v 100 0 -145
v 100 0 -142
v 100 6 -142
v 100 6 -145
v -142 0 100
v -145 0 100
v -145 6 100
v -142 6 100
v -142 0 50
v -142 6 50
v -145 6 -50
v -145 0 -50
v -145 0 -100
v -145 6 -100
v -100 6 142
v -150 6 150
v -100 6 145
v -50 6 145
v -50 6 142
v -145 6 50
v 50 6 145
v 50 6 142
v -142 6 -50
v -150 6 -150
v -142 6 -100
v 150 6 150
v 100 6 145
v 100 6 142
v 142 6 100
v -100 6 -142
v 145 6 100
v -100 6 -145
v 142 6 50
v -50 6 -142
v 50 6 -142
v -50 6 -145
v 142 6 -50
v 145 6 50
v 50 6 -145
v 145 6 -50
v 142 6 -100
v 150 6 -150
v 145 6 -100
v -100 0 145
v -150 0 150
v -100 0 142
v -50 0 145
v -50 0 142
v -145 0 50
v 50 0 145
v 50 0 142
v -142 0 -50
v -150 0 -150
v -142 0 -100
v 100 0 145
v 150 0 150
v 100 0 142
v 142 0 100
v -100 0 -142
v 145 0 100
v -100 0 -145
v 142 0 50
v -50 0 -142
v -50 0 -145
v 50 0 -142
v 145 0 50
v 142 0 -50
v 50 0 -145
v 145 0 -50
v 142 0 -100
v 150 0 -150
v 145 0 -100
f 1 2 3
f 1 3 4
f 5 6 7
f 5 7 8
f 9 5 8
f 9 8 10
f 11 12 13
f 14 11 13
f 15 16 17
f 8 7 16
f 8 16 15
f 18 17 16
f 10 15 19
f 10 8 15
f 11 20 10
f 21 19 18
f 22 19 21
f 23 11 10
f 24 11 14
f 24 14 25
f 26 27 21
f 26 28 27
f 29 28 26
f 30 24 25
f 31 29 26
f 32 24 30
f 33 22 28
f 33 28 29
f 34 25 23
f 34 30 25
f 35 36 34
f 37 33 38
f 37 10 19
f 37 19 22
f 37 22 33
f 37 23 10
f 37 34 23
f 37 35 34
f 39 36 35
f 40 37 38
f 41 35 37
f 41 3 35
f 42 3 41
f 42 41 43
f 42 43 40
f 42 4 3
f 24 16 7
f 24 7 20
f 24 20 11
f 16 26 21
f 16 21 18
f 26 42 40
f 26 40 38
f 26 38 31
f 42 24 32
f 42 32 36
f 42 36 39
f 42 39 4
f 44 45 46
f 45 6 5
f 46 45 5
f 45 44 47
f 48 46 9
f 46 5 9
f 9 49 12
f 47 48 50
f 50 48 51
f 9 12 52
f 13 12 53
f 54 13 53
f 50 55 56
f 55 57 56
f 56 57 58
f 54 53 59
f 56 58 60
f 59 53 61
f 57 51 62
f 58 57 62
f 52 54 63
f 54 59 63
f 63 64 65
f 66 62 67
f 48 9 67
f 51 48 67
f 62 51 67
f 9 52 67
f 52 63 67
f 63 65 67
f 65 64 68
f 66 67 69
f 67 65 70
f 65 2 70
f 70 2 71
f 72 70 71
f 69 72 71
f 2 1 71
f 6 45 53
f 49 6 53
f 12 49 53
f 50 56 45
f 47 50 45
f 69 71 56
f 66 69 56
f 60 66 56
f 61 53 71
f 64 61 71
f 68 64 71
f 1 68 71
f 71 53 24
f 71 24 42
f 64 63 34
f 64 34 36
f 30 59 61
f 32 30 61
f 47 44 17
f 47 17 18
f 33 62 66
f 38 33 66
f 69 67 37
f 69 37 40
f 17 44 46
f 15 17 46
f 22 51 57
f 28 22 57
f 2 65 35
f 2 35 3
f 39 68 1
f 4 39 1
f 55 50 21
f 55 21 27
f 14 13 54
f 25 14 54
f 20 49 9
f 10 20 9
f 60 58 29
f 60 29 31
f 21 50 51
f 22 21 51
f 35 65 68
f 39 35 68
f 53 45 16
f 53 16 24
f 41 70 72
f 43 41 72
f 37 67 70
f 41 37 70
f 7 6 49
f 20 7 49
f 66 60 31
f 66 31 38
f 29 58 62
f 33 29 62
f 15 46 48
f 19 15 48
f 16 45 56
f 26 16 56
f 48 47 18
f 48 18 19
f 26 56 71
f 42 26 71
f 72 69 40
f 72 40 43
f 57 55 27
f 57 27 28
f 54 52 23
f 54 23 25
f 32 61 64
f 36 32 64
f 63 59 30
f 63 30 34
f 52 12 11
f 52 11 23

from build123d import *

# Parameters (mm, degrees)
SKETCH1_W           = 300
SKETCH1_H           = 300
SKETCH1_W_2         = 50
SKETCH1_H_2         = 3
SKETCH1_W_3         = 3
SKETCH1_H_3         = 50
BOSS_EXTRUDE1_DEPTH = 6


with BuildPart() as part:
    # Sketch1 → Boss-Extrude1 (new body)
    with BuildSketch(Plane(origin=(0, 0, 0), x_dir=(1, 0, 0), z_dir=(0, 1, 0))):
        Rectangle(SKETCH1_W, SKETCH1_H)
        with Locations((-75, 143.5)):
            Rectangle(SKETCH1_W_2, SKETCH1_H_2, mode=Mode.SUBTRACT)
        with Locations((75, 143.5)):
            Rectangle(SKETCH1_W_2, SKETCH1_H_2, mode=Mode.SUBTRACT)
        with Locations((143.5, -75)):
            Rectangle(SKETCH1_W_3, SKETCH1_H_3, mode=Mode.SUBTRACT)
        with Locations((143.5, 75)):
            Rectangle(SKETCH1_W_3, SKETCH1_H_3, mode=Mode.SUBTRACT)
        with Locations((75, -143.5)):
            Rectangle(SKETCH1_W_2, SKETCH1_H_2, mode=Mode.SUBTRACT)
        with Locations((-75, -143.5)):
            Rectangle(SKETCH1_W_2, SKETCH1_H_2, mode=Mode.SUBTRACT)
        with Locations((-143.5, 75)):
            Rectangle(SKETCH1_W_3, SKETCH1_H_3, mode=Mode.SUBTRACT)
        with Locations((-143.5, -75)):
            Rectangle(SKETCH1_W_3, SKETCH1_H_3, mode=Mode.SUBTRACT)
    extrude(amount=BOSS_EXTRUDE1_DEPTH)


solid = part.part
